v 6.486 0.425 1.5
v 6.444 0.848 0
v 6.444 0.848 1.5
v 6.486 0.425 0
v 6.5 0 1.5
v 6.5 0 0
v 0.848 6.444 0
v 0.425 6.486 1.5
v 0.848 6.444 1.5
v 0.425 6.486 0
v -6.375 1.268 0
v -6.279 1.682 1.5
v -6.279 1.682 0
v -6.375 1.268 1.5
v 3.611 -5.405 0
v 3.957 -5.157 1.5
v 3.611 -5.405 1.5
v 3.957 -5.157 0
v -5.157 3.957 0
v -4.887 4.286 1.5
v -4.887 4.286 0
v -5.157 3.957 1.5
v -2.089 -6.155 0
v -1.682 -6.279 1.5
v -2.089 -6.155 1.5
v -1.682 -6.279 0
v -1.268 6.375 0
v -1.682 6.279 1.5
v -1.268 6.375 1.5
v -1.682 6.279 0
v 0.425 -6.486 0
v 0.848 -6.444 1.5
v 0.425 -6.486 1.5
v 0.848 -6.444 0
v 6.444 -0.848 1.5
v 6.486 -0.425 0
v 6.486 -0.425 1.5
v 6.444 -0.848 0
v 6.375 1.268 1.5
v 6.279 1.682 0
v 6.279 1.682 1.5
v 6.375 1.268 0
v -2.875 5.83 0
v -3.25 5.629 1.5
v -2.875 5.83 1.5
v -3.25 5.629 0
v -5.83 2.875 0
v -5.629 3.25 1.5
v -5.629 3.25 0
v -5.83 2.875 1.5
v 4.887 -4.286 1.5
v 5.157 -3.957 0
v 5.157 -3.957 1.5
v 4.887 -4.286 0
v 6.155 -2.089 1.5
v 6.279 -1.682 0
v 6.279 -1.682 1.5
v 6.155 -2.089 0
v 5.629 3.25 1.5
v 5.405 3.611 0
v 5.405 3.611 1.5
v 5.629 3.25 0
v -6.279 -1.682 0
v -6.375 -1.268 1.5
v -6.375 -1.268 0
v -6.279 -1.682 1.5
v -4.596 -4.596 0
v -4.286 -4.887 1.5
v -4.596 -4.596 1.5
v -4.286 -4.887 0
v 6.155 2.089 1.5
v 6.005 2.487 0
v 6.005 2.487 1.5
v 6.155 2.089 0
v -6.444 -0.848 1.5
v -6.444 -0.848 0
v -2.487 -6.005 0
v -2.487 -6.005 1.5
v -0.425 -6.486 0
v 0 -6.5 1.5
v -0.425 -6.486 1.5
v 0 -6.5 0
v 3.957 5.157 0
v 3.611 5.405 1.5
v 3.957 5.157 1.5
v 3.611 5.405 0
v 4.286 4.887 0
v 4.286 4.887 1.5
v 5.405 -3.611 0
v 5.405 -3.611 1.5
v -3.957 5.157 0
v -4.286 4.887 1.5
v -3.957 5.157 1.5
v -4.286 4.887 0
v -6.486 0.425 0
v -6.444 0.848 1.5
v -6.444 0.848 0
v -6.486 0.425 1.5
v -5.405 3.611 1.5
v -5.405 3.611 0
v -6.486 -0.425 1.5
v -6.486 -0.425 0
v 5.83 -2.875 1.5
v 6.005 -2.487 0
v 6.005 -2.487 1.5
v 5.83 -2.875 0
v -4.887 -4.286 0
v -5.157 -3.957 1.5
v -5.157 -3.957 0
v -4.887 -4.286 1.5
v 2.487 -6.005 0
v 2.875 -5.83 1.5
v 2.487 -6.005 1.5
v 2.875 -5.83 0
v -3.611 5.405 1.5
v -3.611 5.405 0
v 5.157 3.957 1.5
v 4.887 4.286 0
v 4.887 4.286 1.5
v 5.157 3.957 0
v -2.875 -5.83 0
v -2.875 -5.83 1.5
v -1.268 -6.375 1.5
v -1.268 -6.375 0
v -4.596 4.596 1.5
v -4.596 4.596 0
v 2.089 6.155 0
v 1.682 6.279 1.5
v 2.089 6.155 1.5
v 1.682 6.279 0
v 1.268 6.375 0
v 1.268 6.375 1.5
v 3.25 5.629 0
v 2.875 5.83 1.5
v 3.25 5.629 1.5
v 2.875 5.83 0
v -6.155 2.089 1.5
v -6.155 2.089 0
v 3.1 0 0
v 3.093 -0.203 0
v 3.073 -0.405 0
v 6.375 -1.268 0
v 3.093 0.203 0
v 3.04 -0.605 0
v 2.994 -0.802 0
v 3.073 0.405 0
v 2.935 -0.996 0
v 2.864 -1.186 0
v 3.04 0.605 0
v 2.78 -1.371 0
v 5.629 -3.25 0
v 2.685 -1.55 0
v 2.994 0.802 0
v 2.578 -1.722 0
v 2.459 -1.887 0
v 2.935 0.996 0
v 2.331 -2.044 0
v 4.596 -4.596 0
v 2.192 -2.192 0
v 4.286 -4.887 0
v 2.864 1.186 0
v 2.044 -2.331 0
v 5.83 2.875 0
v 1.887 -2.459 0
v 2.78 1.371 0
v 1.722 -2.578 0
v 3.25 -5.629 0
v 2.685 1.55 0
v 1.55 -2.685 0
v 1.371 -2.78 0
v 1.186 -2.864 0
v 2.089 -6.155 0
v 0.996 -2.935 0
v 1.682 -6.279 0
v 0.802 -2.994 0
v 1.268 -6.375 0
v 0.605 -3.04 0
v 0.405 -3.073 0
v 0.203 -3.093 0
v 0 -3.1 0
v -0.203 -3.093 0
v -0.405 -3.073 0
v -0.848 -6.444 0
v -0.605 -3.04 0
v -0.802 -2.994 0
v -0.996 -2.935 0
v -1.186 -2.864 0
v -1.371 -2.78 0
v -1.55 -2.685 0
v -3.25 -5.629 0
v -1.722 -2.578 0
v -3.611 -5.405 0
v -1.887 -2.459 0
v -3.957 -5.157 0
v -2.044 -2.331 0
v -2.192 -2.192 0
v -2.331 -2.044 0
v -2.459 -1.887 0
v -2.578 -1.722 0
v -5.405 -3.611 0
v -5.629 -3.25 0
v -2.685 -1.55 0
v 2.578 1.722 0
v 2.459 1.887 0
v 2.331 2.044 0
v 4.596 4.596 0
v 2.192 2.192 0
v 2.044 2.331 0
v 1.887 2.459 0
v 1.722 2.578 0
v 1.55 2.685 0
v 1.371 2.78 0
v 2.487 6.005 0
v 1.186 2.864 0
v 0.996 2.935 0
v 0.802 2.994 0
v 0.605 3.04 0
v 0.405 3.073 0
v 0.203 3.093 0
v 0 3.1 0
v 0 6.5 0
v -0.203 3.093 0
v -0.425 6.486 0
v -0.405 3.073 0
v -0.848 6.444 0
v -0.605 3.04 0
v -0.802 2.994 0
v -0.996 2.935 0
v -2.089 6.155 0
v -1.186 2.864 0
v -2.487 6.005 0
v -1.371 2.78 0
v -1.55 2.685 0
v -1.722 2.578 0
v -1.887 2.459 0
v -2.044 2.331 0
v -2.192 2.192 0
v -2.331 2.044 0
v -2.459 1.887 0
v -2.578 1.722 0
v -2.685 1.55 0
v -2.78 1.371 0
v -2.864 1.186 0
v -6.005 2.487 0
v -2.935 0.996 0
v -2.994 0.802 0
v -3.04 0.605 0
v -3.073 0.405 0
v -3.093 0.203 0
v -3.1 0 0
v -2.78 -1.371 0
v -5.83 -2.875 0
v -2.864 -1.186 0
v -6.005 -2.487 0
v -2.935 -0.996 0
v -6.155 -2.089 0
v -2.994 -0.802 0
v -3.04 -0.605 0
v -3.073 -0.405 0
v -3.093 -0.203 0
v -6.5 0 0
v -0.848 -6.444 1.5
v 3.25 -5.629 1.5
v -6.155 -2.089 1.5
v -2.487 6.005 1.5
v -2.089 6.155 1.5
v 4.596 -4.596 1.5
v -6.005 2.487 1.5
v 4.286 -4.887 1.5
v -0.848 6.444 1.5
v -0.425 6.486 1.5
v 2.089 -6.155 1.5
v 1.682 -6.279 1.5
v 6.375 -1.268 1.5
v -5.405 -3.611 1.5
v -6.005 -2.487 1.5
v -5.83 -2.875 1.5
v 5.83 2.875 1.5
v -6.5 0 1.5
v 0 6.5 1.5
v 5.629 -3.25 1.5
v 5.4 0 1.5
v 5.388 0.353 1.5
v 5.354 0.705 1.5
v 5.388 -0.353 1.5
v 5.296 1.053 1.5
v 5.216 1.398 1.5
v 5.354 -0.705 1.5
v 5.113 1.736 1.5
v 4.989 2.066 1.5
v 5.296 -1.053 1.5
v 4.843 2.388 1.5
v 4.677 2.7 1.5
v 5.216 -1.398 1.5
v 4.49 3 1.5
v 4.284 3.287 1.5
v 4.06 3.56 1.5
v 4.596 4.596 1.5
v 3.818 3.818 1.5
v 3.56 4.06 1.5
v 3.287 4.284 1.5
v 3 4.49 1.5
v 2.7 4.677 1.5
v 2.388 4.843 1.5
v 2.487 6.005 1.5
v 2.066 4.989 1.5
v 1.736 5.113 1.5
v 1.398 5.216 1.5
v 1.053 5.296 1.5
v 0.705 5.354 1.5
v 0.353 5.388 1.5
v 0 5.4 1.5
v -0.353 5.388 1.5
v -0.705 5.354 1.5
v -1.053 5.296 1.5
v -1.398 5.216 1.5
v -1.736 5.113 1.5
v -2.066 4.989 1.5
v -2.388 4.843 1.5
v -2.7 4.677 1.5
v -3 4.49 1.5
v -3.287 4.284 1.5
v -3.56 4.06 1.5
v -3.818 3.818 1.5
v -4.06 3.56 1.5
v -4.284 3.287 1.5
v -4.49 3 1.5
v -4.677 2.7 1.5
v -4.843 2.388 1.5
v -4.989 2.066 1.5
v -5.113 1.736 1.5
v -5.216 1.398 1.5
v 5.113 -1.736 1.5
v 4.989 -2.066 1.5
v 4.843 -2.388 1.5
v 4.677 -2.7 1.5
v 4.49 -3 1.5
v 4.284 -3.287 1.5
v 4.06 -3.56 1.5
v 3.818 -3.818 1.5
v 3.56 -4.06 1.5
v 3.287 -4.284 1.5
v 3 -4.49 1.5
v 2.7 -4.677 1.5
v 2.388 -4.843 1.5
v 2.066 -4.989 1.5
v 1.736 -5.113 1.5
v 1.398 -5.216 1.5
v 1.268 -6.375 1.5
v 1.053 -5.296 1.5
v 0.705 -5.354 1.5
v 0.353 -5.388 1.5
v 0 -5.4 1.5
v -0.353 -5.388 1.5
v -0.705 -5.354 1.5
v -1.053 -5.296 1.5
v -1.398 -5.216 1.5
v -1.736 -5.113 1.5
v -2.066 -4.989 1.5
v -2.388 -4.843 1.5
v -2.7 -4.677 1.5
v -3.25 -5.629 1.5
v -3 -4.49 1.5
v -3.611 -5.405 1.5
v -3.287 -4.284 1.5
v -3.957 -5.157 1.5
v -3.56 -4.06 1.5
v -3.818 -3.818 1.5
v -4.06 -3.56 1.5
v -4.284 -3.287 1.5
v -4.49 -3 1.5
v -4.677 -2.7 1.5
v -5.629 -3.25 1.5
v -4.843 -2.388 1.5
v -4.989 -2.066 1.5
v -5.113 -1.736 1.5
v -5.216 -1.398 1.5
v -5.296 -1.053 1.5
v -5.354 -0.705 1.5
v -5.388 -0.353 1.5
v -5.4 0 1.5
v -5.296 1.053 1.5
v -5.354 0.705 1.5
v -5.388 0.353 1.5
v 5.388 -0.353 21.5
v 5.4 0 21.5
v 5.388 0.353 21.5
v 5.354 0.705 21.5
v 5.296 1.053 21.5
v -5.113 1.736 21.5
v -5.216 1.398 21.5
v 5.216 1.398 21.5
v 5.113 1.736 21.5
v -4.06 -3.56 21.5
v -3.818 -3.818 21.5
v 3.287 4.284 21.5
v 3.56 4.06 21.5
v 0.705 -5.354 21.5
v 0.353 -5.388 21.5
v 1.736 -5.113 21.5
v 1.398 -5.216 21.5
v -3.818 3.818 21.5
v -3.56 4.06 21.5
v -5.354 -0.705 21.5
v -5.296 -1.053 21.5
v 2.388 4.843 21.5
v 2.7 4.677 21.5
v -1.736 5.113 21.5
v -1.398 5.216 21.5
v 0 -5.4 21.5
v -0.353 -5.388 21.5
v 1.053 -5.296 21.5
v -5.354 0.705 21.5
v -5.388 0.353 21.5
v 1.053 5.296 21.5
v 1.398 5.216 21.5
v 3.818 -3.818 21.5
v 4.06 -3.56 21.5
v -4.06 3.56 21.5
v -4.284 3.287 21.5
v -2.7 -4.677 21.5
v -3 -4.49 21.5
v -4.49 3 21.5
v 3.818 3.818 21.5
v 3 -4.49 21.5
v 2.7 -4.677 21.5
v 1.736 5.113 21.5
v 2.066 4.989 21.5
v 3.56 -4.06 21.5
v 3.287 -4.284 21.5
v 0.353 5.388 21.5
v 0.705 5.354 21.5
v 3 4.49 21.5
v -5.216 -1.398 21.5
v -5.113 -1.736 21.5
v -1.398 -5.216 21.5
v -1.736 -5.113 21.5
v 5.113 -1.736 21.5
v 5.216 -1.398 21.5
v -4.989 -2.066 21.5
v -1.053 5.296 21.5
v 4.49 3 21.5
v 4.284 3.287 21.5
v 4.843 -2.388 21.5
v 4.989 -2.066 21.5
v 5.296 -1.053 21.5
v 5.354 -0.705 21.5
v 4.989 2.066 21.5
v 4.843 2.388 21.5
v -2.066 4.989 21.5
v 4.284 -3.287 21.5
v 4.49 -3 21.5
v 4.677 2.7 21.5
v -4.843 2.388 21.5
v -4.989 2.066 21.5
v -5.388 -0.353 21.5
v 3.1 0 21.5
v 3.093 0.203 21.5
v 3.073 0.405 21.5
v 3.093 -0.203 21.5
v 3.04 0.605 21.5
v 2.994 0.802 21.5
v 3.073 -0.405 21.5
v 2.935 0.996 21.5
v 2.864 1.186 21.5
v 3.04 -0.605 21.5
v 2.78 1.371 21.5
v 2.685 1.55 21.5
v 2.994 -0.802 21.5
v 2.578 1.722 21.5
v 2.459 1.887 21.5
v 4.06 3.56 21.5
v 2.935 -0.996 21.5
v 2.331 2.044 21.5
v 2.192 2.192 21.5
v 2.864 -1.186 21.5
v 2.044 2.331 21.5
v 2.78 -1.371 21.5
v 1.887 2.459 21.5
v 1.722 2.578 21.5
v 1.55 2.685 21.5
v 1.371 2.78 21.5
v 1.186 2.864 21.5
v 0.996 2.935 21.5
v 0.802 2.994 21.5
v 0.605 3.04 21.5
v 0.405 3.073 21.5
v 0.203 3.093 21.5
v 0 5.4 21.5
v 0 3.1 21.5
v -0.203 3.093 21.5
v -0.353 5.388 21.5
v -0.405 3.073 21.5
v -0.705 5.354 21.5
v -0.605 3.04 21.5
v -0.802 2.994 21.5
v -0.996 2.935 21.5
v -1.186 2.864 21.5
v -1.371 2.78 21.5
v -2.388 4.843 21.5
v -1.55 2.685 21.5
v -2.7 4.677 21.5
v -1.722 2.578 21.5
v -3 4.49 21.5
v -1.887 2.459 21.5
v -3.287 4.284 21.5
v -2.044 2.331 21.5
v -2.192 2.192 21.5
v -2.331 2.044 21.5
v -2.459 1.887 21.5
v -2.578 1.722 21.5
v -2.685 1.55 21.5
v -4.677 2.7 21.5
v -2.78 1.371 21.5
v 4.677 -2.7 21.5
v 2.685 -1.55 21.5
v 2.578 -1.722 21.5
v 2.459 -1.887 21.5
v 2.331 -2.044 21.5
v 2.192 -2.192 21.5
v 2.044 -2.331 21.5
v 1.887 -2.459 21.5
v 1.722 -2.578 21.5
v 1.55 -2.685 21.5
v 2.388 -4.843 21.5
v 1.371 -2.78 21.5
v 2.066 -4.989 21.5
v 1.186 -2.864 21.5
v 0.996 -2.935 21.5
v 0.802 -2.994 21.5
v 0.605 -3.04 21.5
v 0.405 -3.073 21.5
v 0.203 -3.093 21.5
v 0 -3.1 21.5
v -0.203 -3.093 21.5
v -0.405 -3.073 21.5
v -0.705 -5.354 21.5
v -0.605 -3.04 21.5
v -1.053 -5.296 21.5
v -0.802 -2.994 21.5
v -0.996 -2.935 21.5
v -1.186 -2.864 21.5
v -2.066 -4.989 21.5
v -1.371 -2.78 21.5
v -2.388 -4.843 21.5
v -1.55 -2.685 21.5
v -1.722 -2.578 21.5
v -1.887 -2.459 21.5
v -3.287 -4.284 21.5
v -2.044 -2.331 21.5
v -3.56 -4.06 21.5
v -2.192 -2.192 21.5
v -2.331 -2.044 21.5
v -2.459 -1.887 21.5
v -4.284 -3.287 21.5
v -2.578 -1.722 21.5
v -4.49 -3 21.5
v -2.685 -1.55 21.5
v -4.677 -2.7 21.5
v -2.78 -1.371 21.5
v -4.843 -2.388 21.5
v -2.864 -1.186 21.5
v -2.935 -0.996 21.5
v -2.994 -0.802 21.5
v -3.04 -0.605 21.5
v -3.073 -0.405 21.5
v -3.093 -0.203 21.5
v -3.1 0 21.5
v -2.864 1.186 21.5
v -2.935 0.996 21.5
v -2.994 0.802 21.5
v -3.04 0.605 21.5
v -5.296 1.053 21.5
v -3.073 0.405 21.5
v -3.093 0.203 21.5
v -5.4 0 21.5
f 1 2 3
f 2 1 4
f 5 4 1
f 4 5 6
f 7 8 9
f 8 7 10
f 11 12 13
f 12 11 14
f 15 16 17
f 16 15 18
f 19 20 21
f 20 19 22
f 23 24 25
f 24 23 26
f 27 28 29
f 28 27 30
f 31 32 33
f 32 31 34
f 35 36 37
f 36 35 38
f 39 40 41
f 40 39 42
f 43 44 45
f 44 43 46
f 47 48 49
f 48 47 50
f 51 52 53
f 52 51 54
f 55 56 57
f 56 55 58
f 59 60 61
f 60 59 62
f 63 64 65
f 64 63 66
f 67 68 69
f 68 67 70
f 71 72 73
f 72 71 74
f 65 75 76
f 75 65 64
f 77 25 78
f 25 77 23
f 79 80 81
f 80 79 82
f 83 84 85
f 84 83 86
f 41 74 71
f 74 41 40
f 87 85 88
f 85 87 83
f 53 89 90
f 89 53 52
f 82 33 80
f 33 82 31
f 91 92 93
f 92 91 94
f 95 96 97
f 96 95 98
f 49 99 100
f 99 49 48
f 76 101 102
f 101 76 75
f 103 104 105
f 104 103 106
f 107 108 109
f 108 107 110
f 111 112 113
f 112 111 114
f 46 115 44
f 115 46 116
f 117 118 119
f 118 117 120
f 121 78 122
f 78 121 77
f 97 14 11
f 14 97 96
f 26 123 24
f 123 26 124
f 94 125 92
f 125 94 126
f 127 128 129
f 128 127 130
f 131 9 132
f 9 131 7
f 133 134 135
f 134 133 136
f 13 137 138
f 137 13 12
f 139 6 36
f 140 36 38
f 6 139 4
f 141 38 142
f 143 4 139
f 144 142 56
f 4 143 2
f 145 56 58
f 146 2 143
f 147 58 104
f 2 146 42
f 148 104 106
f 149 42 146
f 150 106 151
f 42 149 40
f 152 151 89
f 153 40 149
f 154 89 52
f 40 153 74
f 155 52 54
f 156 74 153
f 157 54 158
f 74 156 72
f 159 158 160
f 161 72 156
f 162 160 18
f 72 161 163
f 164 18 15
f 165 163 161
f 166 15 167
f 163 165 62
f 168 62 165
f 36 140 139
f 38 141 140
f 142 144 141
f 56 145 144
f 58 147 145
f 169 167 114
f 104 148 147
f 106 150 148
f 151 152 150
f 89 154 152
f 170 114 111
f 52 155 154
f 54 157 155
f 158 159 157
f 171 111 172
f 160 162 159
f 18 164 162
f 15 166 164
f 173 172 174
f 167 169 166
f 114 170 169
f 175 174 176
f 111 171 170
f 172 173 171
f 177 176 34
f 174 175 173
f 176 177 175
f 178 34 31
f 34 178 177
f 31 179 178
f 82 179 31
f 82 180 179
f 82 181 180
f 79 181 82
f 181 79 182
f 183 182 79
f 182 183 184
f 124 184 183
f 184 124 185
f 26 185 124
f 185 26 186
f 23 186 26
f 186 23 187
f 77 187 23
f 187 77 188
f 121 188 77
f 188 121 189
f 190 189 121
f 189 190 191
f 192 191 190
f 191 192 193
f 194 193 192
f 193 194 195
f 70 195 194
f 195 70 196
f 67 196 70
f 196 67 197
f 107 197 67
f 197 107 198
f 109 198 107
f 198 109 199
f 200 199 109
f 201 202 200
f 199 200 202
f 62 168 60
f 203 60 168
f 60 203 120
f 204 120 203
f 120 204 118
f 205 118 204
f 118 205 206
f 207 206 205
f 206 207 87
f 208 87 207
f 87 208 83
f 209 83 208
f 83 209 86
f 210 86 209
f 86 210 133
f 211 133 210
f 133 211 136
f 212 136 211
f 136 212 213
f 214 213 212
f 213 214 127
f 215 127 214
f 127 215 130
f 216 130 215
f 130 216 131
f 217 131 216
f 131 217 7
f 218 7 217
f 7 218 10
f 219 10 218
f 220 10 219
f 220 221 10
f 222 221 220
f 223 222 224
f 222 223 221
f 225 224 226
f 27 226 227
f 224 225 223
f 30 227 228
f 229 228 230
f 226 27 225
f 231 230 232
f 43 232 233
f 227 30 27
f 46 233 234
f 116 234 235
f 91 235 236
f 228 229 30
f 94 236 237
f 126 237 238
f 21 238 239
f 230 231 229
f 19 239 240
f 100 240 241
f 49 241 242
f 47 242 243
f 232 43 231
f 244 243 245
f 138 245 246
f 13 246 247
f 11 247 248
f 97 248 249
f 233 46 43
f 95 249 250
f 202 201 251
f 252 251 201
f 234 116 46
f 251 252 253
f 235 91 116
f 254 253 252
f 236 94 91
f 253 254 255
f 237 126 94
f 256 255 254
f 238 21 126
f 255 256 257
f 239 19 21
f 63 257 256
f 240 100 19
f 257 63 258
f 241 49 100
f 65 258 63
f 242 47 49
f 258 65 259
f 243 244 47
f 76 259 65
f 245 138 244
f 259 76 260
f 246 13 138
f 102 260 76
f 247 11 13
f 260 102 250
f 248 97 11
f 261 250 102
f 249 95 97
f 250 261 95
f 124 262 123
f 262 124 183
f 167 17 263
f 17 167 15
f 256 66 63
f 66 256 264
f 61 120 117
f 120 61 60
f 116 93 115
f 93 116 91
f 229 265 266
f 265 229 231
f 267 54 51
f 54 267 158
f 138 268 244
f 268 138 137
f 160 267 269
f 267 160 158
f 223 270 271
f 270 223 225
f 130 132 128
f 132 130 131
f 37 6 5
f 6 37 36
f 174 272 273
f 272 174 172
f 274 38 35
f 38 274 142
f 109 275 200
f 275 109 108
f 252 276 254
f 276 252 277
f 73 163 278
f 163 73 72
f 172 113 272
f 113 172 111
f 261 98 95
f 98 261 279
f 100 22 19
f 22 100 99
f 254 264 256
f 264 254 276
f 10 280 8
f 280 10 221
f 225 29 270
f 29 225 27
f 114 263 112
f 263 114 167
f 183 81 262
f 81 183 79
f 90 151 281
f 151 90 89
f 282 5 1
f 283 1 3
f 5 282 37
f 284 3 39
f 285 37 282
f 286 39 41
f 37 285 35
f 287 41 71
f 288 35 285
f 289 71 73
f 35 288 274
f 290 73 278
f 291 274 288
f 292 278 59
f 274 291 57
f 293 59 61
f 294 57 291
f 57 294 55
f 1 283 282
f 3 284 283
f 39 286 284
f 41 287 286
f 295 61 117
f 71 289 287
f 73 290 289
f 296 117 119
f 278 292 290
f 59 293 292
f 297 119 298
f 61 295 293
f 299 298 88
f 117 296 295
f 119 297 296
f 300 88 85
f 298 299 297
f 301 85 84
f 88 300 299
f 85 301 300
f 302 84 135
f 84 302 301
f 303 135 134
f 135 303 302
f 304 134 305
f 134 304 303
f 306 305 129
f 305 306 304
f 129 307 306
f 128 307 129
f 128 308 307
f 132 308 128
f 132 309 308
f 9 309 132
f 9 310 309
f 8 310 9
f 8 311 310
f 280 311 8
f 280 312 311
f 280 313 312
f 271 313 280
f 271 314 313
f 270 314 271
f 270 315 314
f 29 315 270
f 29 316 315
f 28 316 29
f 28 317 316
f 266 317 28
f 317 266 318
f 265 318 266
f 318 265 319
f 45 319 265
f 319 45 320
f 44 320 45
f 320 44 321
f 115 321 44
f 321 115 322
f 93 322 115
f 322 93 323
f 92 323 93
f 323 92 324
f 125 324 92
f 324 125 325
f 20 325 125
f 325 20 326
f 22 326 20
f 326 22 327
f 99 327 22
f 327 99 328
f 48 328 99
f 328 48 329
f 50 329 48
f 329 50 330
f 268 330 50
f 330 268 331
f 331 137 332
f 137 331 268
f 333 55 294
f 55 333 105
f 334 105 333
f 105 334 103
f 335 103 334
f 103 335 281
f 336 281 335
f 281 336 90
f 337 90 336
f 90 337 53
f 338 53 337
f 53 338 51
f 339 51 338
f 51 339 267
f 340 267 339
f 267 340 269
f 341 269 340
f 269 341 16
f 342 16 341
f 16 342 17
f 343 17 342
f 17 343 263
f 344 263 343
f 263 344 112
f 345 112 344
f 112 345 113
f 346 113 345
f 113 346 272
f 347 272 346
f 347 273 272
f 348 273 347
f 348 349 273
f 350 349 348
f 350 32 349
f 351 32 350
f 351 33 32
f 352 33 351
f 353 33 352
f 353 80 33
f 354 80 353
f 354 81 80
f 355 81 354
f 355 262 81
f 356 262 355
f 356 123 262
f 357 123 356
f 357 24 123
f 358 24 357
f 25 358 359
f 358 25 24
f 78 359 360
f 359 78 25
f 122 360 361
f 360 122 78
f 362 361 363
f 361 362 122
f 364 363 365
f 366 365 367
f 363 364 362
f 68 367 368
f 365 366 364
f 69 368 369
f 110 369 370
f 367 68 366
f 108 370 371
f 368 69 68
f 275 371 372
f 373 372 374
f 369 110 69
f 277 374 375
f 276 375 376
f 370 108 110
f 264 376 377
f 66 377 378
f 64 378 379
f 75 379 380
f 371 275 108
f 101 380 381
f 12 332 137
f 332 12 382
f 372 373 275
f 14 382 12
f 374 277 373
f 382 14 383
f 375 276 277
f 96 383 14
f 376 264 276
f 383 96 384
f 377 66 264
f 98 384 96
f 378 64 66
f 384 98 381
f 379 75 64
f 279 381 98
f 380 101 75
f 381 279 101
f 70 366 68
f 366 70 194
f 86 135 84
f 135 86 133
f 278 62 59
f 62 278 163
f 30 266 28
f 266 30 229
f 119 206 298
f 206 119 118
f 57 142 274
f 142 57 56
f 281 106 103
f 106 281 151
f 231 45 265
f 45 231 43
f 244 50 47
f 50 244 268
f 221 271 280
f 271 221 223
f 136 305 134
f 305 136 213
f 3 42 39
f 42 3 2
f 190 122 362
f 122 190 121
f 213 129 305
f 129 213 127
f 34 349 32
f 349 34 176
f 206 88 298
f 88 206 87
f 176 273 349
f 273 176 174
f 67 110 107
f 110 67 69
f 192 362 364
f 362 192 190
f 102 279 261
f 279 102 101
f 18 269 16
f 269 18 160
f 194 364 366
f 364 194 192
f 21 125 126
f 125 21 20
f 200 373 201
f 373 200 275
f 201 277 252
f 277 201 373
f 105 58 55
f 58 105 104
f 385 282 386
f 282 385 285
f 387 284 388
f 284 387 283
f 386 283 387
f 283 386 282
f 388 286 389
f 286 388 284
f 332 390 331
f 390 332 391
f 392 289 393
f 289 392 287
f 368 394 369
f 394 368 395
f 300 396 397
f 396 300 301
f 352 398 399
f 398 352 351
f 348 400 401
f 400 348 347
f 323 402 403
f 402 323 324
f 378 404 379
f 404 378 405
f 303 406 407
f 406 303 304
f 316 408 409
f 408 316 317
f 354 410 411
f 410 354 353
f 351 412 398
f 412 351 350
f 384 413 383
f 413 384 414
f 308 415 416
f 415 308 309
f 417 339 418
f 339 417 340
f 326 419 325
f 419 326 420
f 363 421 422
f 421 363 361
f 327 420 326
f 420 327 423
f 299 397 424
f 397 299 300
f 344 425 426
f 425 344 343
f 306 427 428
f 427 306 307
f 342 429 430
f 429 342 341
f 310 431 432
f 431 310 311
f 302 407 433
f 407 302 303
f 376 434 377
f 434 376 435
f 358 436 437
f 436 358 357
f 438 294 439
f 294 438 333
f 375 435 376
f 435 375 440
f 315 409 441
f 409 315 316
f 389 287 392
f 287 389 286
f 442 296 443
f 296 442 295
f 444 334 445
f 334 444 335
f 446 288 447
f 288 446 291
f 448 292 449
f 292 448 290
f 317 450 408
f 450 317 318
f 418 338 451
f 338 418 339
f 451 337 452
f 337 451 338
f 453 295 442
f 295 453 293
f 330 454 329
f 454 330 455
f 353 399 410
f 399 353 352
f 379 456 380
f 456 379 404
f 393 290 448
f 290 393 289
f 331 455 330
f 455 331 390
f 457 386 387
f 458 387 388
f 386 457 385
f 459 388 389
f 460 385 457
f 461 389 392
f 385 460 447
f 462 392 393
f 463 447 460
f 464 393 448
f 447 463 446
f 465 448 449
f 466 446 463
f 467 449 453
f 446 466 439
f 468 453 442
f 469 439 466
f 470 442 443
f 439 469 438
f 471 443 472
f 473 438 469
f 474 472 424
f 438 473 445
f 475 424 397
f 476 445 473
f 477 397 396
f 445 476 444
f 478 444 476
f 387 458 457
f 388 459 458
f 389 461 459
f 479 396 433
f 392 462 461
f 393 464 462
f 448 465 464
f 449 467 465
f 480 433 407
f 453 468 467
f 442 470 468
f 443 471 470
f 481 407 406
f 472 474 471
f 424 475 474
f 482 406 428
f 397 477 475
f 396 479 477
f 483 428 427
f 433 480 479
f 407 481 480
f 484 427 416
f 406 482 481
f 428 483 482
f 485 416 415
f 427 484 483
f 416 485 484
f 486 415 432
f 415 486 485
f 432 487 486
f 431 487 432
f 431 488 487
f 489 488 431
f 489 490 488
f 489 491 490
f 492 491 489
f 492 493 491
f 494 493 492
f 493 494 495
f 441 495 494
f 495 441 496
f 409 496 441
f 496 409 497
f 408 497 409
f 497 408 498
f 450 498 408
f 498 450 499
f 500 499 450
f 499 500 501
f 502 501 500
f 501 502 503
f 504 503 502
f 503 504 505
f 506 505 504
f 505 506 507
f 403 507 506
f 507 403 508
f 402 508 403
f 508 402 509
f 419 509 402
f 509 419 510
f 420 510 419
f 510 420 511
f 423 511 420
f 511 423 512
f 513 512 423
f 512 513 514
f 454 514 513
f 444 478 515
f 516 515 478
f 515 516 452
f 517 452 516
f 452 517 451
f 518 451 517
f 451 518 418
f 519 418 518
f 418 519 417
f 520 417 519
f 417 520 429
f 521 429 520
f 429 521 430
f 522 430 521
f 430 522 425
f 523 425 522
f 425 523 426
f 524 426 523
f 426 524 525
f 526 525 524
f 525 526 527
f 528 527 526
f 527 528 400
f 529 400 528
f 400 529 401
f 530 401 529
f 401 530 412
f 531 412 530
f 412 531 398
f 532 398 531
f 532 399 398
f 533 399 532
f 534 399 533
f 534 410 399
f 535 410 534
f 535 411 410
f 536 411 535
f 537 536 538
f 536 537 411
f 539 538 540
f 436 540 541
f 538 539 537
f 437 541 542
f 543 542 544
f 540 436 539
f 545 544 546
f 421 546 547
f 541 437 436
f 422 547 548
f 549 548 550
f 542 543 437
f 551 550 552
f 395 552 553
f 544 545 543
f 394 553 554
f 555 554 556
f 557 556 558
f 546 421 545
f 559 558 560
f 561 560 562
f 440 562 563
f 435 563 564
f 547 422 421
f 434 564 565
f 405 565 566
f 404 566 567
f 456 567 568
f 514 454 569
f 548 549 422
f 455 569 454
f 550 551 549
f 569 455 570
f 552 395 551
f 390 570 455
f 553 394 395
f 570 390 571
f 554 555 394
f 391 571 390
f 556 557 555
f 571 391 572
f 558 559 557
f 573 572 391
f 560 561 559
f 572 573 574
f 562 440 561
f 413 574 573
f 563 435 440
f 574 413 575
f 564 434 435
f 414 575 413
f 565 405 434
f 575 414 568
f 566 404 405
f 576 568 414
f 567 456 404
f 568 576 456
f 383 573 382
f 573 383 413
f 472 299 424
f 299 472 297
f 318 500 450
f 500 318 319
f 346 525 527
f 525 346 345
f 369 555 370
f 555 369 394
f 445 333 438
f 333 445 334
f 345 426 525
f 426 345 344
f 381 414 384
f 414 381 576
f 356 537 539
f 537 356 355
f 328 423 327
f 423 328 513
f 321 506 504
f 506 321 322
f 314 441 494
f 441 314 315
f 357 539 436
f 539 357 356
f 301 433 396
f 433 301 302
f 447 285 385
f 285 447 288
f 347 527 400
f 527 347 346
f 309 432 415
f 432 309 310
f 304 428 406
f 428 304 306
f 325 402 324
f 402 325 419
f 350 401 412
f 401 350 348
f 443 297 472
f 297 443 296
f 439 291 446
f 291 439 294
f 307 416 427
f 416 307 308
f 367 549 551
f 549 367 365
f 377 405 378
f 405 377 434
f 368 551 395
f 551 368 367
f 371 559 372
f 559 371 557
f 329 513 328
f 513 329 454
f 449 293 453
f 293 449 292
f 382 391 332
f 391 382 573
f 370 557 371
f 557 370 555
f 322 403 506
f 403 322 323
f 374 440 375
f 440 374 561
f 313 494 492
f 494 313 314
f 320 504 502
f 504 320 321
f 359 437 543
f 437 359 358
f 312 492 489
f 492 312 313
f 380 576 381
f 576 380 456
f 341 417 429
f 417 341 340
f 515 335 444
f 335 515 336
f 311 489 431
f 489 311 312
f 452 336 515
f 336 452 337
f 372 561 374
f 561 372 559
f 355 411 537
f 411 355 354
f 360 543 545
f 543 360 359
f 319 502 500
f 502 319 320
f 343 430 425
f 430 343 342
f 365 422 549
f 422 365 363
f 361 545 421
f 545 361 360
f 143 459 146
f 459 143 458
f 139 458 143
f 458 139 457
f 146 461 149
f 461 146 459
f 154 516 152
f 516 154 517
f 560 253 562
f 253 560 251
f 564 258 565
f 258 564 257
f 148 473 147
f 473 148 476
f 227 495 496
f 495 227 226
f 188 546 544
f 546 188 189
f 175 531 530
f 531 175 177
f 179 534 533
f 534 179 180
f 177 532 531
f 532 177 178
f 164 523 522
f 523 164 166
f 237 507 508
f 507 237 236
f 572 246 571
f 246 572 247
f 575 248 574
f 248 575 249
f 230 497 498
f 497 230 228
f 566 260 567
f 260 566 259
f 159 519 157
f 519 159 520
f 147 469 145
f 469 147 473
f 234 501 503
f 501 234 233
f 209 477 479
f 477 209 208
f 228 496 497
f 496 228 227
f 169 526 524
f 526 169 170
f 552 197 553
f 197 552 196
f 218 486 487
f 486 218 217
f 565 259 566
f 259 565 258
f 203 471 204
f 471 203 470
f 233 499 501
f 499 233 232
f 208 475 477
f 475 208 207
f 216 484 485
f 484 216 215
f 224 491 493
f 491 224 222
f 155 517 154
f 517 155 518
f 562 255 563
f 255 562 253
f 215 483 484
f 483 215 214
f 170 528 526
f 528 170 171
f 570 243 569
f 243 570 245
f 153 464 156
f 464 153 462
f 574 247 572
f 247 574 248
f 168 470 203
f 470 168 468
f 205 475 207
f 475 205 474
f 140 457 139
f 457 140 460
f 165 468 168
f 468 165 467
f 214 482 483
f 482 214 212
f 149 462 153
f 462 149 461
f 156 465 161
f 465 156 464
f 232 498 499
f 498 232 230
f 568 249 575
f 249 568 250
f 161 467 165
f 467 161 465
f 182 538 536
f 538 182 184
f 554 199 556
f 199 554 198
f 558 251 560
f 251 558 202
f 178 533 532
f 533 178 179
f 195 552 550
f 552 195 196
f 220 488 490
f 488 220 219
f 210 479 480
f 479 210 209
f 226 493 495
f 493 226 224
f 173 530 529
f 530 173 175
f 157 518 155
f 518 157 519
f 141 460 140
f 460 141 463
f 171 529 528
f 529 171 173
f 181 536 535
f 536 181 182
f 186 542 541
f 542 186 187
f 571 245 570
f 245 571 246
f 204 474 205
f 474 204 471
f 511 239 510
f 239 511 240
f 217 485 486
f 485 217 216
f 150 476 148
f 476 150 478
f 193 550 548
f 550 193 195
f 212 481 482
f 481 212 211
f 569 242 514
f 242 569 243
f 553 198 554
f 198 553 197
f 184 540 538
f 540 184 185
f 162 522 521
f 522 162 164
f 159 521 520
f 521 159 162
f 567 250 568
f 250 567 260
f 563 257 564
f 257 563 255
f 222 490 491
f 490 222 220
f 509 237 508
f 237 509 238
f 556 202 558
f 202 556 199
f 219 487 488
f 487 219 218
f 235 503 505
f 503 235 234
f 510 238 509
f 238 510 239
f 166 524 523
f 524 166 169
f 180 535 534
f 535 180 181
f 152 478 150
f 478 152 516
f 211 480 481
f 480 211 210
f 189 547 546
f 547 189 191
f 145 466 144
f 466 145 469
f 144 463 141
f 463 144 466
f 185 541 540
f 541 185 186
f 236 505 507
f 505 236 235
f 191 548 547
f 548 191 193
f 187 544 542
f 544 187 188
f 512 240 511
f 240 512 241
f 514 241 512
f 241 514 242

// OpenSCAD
// Adapter sleeve: 0.2 mL PCR tube in a 1.5 mL rack hole
// Print orientation: collar on the bed (z = 0), sleeve body builds upward

// ---------- Dimensions (mm) ----------
collar_d        = 13;    // collar outer diameter
collar_h        = 1.5;   // collar thickness (z = 0 to 1.5)
sleeve_od       = 10.8;  // sleeve body outer diameter
sleeve_top_z    = 21.5;  // top of sleeve body (z)
bore_d          = 6.2;   // through-bore diameter
eps             = 0.5;   // cutter overshoot past faces

$fn = 96;

// ---------- Model ----------
difference() {
    union() {
        // Collar
        cylinder(d = collar_d, h = collar_h);
        // Sleeve body (overlaps collar slightly for a clean union)
        translate([0, 0, collar_h - 0.01])
            cylinder(d = sleeve_od, h = sleeve_top_z - collar_h + 0.01);
    }
    // Full-height bore, open at both ends
    translate([0, 0, -eps])
        cylinder(d = bore_d, h = sleeve_top_z + 2 * eps);
}
